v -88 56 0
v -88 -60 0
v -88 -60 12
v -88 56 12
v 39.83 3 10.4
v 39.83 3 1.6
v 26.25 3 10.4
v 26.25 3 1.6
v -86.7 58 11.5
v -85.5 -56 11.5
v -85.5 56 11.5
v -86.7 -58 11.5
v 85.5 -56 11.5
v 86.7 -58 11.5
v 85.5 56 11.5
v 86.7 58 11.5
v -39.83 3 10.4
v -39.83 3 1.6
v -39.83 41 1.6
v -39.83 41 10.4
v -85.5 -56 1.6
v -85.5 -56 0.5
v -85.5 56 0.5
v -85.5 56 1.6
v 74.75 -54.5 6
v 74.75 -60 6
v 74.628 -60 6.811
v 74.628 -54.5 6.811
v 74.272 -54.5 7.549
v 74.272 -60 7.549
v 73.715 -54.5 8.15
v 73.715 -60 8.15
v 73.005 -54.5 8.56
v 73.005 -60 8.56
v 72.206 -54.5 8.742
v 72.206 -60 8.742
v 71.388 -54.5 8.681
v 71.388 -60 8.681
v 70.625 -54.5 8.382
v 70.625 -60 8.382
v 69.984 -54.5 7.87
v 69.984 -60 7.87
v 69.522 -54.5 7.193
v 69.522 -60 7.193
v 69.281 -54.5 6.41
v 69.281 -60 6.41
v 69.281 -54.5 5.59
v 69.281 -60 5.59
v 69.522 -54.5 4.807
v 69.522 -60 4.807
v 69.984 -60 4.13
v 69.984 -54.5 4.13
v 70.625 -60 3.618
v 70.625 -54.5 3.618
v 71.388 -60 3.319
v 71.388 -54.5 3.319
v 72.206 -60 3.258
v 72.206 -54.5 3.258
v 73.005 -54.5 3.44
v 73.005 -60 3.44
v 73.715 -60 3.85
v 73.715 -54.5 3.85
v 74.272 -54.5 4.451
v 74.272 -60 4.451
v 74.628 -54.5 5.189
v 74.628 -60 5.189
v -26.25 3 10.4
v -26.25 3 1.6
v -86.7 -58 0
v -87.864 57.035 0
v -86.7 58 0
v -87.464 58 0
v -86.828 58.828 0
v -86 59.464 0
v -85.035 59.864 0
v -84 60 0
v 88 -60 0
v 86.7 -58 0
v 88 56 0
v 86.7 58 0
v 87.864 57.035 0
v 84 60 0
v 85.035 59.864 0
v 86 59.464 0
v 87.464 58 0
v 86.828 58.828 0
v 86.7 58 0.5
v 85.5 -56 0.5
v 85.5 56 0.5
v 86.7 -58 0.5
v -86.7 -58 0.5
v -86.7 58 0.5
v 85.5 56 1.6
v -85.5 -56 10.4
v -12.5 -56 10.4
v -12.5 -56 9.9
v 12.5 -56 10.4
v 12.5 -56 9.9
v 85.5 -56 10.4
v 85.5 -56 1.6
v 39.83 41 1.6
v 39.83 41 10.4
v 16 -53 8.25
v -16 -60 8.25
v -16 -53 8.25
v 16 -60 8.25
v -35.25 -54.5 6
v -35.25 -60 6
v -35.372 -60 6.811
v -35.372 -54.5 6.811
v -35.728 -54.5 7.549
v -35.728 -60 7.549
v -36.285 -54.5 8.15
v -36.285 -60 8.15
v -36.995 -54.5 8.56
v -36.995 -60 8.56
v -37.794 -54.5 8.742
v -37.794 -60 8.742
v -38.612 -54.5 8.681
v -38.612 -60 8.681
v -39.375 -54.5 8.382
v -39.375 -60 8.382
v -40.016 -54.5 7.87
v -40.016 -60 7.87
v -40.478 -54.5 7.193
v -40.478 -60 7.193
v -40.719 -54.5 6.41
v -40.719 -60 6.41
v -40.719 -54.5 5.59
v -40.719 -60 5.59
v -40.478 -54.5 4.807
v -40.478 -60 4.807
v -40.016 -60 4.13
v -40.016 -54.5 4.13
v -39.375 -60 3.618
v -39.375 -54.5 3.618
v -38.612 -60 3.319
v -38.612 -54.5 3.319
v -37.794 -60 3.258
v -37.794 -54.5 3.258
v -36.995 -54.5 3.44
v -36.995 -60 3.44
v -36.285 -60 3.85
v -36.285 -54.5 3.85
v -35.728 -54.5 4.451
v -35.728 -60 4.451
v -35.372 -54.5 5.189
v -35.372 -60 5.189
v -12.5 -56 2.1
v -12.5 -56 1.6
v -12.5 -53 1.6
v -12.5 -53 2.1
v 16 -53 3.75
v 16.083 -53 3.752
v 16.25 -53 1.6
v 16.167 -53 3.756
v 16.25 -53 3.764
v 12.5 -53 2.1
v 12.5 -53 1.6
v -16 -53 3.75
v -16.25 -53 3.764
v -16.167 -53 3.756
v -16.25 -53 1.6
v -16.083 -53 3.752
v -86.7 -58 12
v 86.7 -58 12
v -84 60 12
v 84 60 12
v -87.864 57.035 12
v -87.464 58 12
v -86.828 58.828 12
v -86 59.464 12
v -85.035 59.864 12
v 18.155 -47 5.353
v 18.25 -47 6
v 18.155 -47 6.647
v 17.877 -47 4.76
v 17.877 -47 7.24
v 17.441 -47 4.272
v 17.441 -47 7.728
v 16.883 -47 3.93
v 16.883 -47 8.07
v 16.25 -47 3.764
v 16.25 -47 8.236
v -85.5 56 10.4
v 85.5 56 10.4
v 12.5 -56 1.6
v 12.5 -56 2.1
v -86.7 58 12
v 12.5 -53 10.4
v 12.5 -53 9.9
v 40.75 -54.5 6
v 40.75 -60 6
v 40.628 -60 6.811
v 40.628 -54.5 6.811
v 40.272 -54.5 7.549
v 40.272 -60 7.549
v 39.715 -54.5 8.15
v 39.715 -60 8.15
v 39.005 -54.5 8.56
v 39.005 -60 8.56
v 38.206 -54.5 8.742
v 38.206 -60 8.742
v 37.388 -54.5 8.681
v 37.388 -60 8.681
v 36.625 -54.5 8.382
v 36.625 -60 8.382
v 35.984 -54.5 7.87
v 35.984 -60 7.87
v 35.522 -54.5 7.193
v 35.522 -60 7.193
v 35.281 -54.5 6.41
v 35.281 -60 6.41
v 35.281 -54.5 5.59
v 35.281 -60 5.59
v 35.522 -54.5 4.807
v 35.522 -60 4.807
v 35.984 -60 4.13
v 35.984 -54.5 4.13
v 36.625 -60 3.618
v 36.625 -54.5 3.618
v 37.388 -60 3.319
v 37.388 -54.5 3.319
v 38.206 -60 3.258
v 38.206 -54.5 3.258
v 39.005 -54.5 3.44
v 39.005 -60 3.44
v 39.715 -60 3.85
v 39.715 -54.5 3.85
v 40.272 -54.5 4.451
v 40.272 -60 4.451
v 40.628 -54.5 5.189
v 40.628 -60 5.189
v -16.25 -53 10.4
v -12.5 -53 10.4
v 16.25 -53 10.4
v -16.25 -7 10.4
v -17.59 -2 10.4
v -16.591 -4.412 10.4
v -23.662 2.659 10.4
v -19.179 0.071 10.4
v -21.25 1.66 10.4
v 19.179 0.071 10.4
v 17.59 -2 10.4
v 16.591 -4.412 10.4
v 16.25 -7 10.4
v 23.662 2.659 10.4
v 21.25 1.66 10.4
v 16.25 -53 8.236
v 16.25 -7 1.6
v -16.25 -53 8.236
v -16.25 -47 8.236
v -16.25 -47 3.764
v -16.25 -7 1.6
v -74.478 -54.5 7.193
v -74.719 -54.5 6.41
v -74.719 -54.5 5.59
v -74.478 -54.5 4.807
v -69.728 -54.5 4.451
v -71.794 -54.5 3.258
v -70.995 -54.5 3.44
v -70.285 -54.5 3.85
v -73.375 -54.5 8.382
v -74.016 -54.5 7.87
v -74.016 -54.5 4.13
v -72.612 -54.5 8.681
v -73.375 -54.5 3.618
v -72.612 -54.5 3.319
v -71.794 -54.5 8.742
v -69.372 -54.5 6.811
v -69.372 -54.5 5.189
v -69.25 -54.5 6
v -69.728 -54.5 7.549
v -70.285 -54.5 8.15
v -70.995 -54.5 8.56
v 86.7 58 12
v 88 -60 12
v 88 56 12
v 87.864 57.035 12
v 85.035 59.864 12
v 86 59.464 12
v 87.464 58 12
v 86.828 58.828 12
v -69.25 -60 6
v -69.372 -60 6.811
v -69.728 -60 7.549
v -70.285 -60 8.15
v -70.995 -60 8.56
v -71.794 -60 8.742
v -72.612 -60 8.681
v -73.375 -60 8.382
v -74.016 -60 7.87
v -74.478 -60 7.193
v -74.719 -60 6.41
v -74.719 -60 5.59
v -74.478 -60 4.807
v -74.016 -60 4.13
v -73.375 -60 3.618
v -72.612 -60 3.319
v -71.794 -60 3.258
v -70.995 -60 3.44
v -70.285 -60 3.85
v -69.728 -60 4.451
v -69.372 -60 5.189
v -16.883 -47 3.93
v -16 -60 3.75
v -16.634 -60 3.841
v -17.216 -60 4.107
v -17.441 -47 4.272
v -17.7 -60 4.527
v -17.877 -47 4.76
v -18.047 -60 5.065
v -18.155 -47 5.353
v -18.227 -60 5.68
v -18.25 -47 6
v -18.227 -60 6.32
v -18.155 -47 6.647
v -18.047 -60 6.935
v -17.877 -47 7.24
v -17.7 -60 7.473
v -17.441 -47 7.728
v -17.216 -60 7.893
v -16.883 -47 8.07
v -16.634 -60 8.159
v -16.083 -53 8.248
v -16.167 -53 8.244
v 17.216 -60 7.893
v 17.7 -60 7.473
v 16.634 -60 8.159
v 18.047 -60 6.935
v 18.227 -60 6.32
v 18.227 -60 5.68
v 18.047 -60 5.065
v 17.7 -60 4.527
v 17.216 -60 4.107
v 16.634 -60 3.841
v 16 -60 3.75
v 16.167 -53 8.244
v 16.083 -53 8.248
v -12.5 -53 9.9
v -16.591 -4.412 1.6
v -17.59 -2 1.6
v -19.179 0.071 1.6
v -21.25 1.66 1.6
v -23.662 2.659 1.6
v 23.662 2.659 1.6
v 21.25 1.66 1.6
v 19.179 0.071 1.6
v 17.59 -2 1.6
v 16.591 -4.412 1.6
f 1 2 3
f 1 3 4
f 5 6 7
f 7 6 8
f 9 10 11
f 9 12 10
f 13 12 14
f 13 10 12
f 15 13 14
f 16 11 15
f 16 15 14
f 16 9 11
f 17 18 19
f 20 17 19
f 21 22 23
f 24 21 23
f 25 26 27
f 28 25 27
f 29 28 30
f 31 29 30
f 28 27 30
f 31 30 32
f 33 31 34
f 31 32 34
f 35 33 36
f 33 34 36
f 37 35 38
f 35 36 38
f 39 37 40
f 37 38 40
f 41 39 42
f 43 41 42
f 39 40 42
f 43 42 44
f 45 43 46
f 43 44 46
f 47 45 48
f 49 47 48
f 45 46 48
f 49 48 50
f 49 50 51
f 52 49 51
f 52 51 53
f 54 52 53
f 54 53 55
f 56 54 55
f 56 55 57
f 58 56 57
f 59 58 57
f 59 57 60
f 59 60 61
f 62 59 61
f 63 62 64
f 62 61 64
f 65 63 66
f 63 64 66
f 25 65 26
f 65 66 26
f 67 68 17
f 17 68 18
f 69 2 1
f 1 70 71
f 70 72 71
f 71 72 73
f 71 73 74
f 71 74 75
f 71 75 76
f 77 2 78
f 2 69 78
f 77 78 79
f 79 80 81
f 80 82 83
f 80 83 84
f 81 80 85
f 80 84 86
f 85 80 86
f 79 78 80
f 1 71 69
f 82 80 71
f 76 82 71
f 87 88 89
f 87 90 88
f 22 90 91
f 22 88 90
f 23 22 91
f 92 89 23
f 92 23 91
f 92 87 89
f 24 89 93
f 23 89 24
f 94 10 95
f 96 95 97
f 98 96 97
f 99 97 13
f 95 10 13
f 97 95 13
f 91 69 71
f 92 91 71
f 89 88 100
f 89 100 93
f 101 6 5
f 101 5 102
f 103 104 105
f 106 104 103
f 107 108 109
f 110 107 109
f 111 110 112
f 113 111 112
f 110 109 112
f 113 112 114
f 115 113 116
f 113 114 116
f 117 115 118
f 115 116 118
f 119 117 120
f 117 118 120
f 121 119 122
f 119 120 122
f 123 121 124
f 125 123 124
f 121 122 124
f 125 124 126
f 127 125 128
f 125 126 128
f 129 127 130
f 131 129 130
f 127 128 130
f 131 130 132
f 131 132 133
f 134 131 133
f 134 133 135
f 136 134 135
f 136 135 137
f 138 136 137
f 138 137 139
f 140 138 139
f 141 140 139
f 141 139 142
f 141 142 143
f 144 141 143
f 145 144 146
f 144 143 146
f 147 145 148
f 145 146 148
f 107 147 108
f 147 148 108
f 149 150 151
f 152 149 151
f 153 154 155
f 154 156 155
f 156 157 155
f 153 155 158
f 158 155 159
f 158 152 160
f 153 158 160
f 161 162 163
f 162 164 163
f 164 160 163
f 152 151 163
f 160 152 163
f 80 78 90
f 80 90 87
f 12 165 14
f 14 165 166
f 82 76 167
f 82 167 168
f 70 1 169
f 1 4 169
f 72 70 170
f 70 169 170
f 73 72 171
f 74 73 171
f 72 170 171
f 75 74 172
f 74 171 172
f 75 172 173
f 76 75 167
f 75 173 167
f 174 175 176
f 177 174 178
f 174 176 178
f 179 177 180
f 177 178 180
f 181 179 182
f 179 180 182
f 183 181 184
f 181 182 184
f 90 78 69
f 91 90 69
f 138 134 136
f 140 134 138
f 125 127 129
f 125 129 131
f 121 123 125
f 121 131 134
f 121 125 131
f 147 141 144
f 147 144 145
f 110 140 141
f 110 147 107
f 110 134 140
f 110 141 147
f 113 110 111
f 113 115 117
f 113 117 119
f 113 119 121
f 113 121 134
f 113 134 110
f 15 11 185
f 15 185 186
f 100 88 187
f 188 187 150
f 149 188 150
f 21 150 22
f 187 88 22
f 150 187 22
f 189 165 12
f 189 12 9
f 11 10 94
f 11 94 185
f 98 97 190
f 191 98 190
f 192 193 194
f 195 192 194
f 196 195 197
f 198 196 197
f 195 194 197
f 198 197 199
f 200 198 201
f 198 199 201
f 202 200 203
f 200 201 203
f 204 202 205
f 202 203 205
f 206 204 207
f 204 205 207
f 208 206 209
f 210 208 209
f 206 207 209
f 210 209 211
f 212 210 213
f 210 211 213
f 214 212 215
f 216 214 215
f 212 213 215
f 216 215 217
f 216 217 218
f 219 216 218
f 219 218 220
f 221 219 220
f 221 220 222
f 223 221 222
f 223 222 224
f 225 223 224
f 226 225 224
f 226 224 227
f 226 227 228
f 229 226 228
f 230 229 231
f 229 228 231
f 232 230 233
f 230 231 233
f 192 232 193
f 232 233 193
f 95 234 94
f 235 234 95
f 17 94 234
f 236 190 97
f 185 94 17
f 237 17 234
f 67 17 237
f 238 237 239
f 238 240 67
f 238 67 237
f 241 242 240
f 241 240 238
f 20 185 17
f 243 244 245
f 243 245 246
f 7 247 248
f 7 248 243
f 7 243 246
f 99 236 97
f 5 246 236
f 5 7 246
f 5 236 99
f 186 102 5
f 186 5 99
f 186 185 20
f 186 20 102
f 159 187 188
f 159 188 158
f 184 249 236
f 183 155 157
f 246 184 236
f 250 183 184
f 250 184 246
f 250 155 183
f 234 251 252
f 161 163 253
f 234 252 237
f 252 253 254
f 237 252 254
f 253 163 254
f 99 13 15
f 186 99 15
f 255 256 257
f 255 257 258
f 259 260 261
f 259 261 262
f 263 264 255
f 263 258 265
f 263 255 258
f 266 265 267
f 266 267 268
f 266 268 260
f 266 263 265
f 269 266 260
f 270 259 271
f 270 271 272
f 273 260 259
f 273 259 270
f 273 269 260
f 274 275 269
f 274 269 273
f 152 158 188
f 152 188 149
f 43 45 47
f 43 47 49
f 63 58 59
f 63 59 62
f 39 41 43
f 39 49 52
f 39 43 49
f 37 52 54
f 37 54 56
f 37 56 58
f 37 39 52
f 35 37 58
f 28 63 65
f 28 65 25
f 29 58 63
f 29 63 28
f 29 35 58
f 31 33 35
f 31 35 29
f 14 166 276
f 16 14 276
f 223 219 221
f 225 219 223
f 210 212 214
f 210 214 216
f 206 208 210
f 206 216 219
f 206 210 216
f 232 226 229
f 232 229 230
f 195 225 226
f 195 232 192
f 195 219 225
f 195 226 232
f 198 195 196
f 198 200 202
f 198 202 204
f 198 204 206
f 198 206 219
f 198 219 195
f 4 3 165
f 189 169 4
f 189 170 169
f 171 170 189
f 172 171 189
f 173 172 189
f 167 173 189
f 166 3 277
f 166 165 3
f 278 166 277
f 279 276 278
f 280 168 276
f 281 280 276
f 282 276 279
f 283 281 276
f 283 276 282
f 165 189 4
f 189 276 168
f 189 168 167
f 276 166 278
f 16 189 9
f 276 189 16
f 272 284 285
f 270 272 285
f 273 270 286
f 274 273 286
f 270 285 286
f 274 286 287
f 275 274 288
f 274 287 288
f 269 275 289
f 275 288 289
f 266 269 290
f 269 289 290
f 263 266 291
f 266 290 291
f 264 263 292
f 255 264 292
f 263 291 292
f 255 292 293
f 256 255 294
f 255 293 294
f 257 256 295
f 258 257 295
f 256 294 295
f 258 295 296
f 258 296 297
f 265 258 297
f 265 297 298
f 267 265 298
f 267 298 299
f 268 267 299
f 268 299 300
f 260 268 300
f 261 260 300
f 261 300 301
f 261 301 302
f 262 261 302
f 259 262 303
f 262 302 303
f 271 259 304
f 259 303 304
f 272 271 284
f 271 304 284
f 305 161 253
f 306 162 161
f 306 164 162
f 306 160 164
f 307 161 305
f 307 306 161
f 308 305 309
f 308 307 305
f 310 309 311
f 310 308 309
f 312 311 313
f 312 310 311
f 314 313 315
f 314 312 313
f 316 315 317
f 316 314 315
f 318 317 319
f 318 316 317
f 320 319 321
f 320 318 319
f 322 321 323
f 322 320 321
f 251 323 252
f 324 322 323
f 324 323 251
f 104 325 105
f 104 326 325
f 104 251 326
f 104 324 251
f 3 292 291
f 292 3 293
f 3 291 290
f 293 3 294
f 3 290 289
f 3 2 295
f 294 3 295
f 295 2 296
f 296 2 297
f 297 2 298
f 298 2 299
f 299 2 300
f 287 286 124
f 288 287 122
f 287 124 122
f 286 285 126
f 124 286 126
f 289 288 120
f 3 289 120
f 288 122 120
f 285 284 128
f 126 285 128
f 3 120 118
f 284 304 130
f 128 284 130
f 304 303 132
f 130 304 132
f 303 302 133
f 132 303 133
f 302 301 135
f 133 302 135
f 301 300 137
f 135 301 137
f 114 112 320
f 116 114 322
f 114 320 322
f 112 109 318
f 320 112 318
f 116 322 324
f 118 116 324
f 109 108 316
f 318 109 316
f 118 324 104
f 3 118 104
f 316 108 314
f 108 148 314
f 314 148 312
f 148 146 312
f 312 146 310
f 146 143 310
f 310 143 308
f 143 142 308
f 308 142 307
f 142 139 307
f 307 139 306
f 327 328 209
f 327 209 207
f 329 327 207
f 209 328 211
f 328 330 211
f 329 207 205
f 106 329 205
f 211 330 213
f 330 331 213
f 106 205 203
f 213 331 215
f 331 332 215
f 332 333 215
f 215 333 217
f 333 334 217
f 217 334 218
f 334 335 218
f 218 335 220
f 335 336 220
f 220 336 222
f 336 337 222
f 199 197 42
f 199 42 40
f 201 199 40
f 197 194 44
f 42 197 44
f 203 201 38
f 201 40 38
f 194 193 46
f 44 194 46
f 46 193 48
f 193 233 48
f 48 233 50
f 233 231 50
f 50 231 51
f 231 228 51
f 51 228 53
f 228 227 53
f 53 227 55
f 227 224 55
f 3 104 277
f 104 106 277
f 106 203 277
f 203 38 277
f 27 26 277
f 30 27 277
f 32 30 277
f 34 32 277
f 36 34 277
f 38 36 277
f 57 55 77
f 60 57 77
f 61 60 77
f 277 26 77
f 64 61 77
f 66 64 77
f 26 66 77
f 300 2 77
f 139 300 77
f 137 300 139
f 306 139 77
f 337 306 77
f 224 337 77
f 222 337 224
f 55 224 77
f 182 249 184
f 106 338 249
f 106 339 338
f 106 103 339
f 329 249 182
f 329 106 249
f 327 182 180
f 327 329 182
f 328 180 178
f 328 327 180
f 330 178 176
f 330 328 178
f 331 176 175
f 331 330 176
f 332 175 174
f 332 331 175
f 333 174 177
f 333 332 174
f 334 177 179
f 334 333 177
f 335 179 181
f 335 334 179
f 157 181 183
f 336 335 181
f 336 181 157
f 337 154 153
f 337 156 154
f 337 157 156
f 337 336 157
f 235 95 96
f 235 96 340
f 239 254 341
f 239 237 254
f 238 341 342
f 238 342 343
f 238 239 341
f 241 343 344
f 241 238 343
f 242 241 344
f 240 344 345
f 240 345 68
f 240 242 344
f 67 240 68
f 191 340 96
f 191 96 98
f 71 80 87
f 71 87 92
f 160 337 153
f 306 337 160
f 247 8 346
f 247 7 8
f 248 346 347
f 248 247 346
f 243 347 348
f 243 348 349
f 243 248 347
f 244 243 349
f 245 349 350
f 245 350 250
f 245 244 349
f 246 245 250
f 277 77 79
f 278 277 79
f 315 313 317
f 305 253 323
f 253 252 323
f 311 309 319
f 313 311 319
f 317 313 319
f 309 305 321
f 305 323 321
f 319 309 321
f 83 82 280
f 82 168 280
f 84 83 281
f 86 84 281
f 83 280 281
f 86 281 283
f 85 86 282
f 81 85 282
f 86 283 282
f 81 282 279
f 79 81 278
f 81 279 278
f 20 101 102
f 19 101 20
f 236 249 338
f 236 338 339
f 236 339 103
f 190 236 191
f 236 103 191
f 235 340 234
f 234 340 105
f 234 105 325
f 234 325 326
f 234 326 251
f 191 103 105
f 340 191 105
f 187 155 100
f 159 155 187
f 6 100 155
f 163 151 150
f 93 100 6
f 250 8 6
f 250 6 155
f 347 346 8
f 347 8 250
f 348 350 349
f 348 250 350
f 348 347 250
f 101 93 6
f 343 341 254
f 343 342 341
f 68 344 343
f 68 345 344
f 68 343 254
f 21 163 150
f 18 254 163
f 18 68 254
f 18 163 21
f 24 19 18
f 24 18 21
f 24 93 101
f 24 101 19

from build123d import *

# Parameters (mm, degrees)
SKETCH_1_W           = 176
SKETCH_1_H           = 120
EXTRUDE_1_DEPTH      = 12
SKETCH_2_W           = 171
SKETCH_2_H           = 112
CUT_EXTRUDE_1_DEPTH  = 1.6
SKETCH_3_W           = 171
SKETCH_3_H           = 112
CUT_EXTRUDE_2_DEPTH  = 1.6
SKETCH_5_W           = 173.4
SKETCH_5_H           = 116
CUT_EXTRUDE_3_DEPTH  = 0.5
SKETCH_6_W           = 173.4
SKETCH_6_H           = 116
CUT_EXTRUDE_4_DEPTH  = 0.5
SKETCH_7_W           = 32.5
SKETCH_7_H           = 56
CUT_EXTRUDE_5_DEPTH  = 108.014765336
SKETCH_8_W           = 25
SKETCH_8_H           = 5
CUT_EXTRUDE_6_DEPTH  = 0.5
SKETCH_9_W           = 25
SKETCH_9_H           = 5
CUT_EXTRUDE_7_DEPTH  = 0.5
FILLET_1_R           = 4
FILLET_2_R           = 4
SKETCH_28_R          = 2.75
CUT_EXTRUDE_16_DEPTH = 5.5
CUT_EXTRUDE_17_DEPTH = 13
SKETCH_31_W          = 79.660251382
SKETCH_31_H          = 38
CUT_EXTRUDE_18_DEPTH = 108.014765336
FILLET_3_R           = 10
FILLET_4_R           = 10


with BuildPart() as part:
    # 草图1 → 凸台-拉伸1 (new body)
    with BuildSketch(Plane.XY):
        Rectangle(SKETCH_1_W, SKETCH_1_H)
    extrude(amount=EXTRUDE_1_DEPTH)

    # 草图2 → 切除-拉伸1 (cut)
    with BuildSketch(Plane.XY.offset(12)):
        Rectangle(SKETCH_2_W, SKETCH_2_H)
    extrude(amount=-CUT_EXTRUDE_1_DEPTH, mode=Mode.SUBTRACT)

    # 草图3 → 切除-拉伸2 (cut)
    with BuildSketch(Plane(origin=(0, 0, 0), x_dir=(-1, 0, 0), z_dir=(0, 0, -1))):
        Rectangle(SKETCH_3_W, SKETCH_3_H)
    extrude(amount=-CUT_EXTRUDE_2_DEPTH, mode=Mode.SUBTRACT)

    # 草图5 → 切除-拉伸3 (cut)
    with BuildSketch(Plane(origin=(0, 0, 0), x_dir=(-1, 0, 0), z_dir=(0, 0, -1))):
        Rectangle(SKETCH_5_W, SKETCH_5_H)
    extrude(amount=-CUT_EXTRUDE_3_DEPTH, mode=Mode.SUBTRACT)

    # 草图6 → 切除-拉伸4 (cut)
    with BuildSketch(Plane.XY.offset(12)):
        Rectangle(SKETCH_6_W, SKETCH_6_H)
    extrude(amount=-CUT_EXTRUDE_4_DEPTH, mode=Mode.SUBTRACT)

    # 草图7 → 切除-拉伸5 (cut, through all)
    with BuildSketch(Plane(origin=(0, 0, 1.6), x_dir=(-1, 0, 0), z_dir=(0, 0, -1))):
        with Locations((0, -25)):
            Rectangle(SKETCH_7_W, SKETCH_7_H)
    extrude(amount=-CUT_EXTRUDE_5_DEPTH, mode=Mode.SUBTRACT)

    # 草图8 → 切除-拉伸6 (cut)
    with BuildSketch(Plane(origin=(0, 0, 1.6), x_dir=(-1, 0, 0), z_dir=(0, 0, -1))):
        with Locations((0, -53.5)):
            Rectangle(SKETCH_8_W, SKETCH_8_H)
    extrude(amount=-CUT_EXTRUDE_6_DEPTH, mode=Mode.SUBTRACT)

    # 草图9 → 切除-拉伸7 (cut)
    with BuildSketch(Plane.XY.offset(10.4)):
        with Locations((0, -53.5)):
            Rectangle(SKETCH_9_W, SKETCH_9_H)
    extrude(amount=-CUT_EXTRUDE_7_DEPTH, mode=Mode.SUBTRACT)

    # 圆角1
    fillet_1_edges = [part.edges().sort_by_distance(p)[0] for p in [
        (-88, 60, 6),
    ]]
    fillet(fillet_1_edges, radius=FILLET_1_R)

    # 圆角2
    fillet_2_edges = [part.edges().sort_by_distance(p)[0] for p in [
        (88, 60, 6),
    ]]
    fillet(fillet_2_edges, radius=FILLET_2_R)

    # 草图28 → 切除-拉伸16 (cut)
    with BuildSketch(Plane(origin=(0, -60, 0), x_dir=(-1, 0, 0), z_dir=(0, -1, 0))):
        with Locations(Location((-72, -6, 0), (0, 0, 180))):
            Circle(SKETCH_28_R)
        with Locations(Location((-38, -6, 0), (0, 0, 180))):
            Circle(SKETCH_28_R)
        with Locations(Location((38, -6, 0), (0, 0, 180))):
            Circle(SKETCH_28_R)
        with Locations(Location((72, -6, 0), (0, 0, 180))):
            Circle(SKETCH_28_R)
    extrude(amount=-CUT_EXTRUDE_16_DEPTH, mode=Mode.SUBTRACT)

    # 草图29 → 切除-拉伸17 (cut)
    with BuildSketch(Plane.XZ.offset(60)):
        with BuildLine():
            Line((-16, 8.25), (16, 8.25))
            ThreePointArc((16, 8.25), (18.25, 6), (16, 3.75))
            Line((16, 3.75), (-16, 3.75))
            ThreePointArc((-16, 3.75), (-18.25, 6), (-16, 8.25))
        make_face()
    extrude(amount=-CUT_EXTRUDE_17_DEPTH, mode=Mode.SUBTRACT)

    # 草图31 → 切除-拉伸18 (cut, through all)
    with BuildSketch(Plane(origin=(0, 0, 1.6), x_dir=(-1, 0, 0), z_dir=(0, 0, -1))):
        with Locations((0, 22)):
            Rectangle(SKETCH_31_W, SKETCH_31_H)
    extrude(amount=-CUT_EXTRUDE_18_DEPTH, mode=Mode.SUBTRACT)

    # 圆角3
    fillet_3_edges = [part.edges().sort_by_distance(p)[0] for p in [
        (-16.25, 3, 6),
    ]]
    fillet(fillet_3_edges, radius=FILLET_3_R)

    # 圆角4
    fillet_4_edges = [part.edges().sort_by_distance(p)[0] for p in [
        (16.25, 3, 6),
    ]]
    fillet(fillet_4_edges, radius=FILLET_4_R)


solid = part.part
